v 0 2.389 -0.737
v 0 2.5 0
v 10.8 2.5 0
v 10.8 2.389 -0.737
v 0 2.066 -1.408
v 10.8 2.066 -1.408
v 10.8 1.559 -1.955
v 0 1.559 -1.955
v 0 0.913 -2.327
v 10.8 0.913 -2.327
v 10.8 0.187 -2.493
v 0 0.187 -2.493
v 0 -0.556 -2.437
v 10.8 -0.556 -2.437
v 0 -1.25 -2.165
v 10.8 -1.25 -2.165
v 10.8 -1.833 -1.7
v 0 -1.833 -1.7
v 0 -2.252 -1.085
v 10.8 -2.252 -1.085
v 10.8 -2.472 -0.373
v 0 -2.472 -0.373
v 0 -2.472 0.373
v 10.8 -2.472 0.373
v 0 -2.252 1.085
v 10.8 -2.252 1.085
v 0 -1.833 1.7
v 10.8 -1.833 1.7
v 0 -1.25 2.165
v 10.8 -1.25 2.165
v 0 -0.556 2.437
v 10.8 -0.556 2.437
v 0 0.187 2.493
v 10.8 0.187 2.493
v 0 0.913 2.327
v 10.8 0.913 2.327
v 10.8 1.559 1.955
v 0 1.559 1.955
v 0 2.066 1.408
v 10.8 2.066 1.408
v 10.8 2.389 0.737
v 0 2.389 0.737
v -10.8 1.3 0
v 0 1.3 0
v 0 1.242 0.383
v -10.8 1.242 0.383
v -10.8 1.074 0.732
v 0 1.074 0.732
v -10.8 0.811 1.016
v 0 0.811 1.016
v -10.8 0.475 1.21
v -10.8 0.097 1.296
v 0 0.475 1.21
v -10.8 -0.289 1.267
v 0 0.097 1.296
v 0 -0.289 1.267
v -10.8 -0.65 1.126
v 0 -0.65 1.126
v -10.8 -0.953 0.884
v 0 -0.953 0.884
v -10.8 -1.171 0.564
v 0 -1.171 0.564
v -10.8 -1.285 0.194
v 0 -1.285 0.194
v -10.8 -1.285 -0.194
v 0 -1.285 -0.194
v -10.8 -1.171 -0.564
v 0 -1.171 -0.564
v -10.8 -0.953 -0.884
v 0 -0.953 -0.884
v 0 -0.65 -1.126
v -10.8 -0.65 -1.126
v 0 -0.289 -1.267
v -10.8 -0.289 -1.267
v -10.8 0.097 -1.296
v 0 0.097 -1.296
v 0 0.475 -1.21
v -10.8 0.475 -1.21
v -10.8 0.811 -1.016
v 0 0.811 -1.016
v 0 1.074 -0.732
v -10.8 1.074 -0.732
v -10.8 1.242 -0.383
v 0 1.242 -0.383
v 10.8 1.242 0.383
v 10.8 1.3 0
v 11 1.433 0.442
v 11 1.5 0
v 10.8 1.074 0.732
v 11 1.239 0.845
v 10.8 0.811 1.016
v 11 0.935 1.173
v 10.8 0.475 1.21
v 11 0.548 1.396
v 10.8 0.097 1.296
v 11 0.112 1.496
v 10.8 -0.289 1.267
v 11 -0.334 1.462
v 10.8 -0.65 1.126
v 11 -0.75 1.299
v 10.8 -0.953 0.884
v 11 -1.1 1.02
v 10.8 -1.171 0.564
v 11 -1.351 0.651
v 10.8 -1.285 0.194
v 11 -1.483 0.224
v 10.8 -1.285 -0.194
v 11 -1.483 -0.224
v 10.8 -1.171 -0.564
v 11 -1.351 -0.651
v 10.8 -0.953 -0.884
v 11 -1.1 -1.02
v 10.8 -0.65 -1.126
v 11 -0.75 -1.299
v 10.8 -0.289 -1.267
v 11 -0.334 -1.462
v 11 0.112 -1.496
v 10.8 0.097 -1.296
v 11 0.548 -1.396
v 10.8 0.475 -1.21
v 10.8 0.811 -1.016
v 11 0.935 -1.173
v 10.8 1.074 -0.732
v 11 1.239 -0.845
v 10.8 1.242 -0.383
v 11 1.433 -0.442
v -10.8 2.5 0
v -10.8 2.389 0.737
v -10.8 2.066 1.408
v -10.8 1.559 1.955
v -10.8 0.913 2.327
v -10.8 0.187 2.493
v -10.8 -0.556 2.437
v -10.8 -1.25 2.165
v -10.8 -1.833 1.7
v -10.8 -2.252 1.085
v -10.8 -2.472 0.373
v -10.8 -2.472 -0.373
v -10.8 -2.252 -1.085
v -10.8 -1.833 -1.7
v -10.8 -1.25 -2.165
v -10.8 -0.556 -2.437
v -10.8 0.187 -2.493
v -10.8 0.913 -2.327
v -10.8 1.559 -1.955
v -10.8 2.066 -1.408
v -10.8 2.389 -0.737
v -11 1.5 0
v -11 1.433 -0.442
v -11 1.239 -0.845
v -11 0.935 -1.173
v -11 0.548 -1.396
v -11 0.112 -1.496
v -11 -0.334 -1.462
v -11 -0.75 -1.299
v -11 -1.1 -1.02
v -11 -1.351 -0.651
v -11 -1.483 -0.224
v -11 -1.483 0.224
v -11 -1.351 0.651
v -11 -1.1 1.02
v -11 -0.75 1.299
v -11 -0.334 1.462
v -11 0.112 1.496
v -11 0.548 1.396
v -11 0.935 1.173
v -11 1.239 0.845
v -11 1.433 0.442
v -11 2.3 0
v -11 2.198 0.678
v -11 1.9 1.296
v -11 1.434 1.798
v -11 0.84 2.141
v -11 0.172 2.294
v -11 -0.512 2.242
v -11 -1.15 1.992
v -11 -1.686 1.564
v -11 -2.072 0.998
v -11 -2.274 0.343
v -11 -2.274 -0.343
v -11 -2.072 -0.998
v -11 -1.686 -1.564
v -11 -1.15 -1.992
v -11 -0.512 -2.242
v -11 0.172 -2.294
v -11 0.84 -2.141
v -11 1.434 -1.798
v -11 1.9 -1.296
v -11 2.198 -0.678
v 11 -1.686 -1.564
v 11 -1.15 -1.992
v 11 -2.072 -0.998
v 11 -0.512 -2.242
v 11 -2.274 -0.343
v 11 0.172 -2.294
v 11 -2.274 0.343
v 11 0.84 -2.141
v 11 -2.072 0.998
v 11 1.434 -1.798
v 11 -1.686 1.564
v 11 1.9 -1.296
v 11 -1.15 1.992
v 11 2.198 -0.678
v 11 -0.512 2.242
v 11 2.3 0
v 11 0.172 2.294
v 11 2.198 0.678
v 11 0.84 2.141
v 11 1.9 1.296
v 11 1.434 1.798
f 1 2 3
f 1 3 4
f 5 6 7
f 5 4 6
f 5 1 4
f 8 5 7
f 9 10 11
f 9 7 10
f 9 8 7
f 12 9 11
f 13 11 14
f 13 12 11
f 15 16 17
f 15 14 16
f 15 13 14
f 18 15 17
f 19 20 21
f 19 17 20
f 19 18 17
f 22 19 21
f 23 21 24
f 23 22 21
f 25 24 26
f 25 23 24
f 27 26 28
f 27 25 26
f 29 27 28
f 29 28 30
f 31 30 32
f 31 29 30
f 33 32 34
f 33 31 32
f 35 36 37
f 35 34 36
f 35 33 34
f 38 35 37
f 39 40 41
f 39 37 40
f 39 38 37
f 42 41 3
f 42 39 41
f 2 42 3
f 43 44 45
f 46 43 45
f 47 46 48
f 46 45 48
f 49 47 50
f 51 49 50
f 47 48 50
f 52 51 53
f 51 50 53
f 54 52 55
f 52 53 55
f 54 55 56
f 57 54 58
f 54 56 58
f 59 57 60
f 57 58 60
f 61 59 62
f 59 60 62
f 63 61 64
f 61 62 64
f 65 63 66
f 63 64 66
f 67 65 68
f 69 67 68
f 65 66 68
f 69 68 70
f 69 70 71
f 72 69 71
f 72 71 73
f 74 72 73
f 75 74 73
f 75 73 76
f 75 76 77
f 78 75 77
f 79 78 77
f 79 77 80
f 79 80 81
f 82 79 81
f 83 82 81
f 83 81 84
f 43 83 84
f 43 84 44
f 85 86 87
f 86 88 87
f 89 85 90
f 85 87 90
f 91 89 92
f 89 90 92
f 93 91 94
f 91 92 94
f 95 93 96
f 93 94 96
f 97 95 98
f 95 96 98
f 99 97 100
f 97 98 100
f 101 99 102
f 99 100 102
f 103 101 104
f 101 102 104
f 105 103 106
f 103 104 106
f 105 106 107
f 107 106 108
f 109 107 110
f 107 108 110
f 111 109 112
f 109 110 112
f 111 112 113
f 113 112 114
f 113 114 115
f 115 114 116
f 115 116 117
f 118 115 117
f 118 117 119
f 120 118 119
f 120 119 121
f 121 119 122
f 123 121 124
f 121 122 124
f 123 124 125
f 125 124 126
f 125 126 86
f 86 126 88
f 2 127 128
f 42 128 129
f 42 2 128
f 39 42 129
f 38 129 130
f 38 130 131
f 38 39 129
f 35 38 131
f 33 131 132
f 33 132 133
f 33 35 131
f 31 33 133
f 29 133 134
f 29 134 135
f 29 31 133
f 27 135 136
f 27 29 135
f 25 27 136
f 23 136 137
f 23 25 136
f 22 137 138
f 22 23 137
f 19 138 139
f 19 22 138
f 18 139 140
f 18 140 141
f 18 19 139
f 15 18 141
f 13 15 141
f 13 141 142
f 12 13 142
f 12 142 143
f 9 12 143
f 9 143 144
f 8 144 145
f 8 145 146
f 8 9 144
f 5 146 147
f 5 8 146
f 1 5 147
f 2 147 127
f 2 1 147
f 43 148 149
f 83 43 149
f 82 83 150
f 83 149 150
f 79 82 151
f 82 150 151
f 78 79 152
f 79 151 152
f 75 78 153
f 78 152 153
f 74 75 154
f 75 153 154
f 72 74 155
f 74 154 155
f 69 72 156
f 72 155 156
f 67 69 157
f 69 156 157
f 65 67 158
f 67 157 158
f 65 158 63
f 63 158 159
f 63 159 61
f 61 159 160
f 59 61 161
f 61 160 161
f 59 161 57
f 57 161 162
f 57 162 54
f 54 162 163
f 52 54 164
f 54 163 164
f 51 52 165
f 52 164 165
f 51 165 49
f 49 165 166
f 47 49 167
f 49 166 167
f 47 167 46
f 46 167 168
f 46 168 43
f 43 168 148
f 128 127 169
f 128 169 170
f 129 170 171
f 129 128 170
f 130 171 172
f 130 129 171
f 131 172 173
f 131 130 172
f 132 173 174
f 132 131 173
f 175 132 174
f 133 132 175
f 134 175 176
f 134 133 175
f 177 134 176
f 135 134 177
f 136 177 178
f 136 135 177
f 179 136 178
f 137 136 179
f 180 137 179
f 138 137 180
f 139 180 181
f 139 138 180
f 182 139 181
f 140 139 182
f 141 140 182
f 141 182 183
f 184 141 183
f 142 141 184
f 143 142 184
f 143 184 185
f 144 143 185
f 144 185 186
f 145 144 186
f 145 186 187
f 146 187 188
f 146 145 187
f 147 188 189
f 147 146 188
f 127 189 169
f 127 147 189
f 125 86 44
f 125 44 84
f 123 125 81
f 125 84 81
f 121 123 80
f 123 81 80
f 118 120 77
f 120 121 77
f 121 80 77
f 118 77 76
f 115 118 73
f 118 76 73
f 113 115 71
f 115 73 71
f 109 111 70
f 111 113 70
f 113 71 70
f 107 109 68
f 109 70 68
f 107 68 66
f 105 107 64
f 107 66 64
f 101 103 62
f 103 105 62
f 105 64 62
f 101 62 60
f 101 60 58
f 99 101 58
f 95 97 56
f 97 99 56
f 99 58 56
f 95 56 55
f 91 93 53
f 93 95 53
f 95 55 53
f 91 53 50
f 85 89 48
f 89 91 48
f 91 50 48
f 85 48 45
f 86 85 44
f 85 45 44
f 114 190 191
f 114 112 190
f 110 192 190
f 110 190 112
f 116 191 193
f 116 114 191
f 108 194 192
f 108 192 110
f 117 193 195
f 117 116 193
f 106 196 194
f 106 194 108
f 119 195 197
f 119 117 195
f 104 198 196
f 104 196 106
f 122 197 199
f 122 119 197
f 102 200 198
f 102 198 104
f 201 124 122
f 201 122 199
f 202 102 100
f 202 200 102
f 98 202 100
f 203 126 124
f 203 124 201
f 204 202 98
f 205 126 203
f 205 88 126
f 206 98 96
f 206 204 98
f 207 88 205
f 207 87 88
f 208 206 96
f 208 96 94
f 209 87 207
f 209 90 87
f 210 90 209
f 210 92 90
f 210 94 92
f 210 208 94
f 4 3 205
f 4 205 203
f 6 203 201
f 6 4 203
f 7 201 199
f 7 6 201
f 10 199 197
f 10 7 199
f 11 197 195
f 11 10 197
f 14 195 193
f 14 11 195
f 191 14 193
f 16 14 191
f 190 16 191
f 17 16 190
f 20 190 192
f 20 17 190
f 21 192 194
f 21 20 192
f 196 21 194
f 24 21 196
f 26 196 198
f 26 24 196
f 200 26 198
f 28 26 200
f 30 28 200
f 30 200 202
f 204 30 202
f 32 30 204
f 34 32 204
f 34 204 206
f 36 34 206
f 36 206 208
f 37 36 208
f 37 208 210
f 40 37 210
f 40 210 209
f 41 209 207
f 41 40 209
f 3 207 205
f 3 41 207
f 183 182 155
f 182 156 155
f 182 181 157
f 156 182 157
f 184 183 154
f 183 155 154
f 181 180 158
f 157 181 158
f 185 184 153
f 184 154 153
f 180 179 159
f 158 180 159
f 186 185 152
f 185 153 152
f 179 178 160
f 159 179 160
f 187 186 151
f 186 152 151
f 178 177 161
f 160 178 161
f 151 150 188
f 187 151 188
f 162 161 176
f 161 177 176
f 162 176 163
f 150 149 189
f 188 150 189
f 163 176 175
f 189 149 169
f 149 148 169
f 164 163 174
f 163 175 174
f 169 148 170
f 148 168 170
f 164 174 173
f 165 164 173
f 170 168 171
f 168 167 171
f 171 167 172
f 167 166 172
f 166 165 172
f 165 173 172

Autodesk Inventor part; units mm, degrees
ref_plane "YZ Plane" through (0, 0, 0) normal (1, 0, 0) x (0, 1, 0)
ref_plane "XZ Plane" through (0, 0, 0) normal (0, 1, 0) x (-1, 0, 0)
ref_plane "XY Plane" through (0, 0, 0) normal (0, 0, 1) x (1, 0, 0)
sketch "スケッチ1" plane through (0, 0, 0) normal (1, 0, 0) x (0, 1, 0)
  circle A0 centre (0, 0) radius 2.5
  circle A1 centre (0, 0) radius 1.3
  dimension "d0" = 5
  dimension "d1" = 2.6
extrude "押し出し1" add sketch "スケッチ1" along normal mid plane 22
chamfer "面取り1" distance 0.2 angle 45 4 edges at (11, -1.3, 0) (11, -2.5, 0) (-11, -1.3, 0) (-11, -2.5, 0)
properties part number "AR-2622"
